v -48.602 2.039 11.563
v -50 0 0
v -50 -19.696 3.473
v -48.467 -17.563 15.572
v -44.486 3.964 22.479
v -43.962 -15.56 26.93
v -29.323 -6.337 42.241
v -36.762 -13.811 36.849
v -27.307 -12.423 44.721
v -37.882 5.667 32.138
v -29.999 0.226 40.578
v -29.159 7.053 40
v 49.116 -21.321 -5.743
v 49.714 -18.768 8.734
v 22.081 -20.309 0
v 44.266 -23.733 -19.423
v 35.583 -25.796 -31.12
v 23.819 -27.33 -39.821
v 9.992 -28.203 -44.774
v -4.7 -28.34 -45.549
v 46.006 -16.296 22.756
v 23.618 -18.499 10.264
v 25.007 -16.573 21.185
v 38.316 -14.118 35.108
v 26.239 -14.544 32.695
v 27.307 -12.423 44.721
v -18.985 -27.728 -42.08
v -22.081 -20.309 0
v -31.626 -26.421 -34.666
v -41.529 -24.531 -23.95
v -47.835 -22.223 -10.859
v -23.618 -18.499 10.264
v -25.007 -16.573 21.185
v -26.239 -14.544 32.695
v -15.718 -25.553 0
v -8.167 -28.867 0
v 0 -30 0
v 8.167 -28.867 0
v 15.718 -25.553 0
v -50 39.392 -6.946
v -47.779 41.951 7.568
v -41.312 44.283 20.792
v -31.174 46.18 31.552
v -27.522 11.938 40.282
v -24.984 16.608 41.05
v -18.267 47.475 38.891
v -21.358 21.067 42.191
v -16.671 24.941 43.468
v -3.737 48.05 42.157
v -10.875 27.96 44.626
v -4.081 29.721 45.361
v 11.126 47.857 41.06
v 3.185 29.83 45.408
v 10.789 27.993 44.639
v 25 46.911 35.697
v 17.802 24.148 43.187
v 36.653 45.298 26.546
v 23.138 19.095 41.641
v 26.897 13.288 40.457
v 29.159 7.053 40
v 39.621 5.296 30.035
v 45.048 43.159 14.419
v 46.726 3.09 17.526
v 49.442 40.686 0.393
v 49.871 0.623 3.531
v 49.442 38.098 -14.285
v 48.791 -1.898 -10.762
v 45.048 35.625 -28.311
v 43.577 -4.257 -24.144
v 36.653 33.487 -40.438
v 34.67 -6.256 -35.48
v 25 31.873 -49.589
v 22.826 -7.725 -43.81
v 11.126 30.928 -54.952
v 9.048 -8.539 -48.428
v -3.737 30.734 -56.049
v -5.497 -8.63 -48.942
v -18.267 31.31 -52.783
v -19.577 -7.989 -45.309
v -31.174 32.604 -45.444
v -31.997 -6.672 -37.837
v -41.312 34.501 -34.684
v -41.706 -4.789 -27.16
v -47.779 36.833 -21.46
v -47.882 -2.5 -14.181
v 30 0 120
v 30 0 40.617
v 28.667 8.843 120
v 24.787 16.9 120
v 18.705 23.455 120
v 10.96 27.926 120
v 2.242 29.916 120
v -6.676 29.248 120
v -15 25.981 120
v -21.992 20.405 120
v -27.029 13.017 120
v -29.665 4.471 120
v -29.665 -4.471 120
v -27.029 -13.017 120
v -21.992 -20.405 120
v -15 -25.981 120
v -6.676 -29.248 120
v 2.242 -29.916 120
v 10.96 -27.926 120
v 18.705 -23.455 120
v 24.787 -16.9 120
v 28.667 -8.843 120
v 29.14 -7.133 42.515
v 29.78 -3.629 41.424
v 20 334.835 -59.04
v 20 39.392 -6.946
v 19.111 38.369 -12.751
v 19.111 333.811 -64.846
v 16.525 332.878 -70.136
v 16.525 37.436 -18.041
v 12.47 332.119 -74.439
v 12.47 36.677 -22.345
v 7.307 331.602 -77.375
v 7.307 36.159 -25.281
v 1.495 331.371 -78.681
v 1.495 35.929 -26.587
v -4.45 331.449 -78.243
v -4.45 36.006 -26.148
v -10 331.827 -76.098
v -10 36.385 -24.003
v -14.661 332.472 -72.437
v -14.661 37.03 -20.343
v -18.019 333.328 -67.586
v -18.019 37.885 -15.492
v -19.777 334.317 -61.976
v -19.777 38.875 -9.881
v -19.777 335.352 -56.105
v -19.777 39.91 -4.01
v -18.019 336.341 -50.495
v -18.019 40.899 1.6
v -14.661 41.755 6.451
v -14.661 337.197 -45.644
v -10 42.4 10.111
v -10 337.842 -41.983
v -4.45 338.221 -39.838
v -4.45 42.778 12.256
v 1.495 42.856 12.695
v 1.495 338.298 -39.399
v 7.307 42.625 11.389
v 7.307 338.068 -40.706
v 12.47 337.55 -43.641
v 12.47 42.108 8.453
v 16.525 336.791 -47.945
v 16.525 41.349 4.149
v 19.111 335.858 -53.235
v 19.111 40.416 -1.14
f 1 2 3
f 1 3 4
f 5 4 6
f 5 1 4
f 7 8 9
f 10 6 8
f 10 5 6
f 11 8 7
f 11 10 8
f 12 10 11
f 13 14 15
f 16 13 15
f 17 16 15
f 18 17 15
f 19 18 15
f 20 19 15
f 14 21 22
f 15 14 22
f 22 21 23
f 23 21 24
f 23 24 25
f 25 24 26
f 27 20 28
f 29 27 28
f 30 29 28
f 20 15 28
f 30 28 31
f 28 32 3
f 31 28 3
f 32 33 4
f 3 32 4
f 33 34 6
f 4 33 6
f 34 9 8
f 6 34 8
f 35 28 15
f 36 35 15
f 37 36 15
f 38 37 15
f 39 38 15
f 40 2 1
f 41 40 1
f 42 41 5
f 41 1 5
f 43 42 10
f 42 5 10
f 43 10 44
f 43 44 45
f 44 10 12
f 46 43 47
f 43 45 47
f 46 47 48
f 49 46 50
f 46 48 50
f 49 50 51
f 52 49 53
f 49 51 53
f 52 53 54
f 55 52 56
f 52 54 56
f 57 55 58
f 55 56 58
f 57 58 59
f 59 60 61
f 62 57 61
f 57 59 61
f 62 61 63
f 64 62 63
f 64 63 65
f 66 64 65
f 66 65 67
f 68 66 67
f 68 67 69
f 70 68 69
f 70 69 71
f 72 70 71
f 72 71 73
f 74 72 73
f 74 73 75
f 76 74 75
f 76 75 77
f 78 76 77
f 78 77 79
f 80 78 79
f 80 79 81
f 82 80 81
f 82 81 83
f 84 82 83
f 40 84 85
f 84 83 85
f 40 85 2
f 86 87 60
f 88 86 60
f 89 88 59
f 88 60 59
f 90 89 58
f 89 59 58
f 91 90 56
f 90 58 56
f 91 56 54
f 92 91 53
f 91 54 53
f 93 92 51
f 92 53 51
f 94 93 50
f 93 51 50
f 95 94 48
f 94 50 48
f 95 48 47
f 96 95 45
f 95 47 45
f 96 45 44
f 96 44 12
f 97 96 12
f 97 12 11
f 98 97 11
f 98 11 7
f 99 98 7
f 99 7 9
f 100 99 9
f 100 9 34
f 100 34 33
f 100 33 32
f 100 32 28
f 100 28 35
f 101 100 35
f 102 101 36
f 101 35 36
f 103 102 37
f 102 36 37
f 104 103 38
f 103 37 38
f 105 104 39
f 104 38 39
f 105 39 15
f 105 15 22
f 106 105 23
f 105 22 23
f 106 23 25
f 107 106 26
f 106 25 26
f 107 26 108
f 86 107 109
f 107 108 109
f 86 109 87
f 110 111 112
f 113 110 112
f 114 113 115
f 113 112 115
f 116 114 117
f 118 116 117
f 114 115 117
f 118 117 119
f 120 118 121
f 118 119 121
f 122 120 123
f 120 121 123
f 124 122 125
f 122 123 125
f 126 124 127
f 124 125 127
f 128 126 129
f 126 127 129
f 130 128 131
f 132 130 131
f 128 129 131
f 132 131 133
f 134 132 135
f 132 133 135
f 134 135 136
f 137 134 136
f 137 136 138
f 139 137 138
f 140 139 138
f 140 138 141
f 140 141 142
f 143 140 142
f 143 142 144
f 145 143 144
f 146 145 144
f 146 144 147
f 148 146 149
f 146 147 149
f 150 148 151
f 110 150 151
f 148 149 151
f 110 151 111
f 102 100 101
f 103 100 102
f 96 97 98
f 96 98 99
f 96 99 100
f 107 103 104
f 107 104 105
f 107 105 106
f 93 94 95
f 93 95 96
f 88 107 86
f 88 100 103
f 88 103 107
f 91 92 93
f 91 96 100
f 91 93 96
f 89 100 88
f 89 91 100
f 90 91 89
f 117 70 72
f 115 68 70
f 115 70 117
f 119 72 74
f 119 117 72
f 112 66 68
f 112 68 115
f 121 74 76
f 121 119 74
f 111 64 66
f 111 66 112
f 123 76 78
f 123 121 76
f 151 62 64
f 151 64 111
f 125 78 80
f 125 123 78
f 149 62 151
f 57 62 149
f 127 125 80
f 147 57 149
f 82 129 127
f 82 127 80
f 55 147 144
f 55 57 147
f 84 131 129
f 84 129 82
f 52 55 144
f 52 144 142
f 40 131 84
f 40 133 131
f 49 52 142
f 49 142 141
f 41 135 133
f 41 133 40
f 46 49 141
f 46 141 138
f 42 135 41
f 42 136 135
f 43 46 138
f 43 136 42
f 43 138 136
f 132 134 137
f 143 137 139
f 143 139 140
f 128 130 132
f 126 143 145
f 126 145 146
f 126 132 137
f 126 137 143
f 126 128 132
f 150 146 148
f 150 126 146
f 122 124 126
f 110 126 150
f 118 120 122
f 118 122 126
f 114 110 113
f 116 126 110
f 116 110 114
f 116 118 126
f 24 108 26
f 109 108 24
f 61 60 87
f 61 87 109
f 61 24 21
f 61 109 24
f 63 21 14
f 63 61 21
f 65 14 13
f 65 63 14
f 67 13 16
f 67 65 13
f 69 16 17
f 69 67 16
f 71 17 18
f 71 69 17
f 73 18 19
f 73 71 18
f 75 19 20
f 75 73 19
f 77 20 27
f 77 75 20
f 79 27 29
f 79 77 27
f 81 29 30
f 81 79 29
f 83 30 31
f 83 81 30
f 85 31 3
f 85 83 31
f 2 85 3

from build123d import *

# Parameters (mm, degrees)
SKETCH1_R                = 30
BOSS_EXTRUDE1_DEPTH      = 120
BOSS_EXTRUDE2_DEPTH      = 40
BOSS_EXTRUDE2_DEPTH_BACK = 20
SKETCH2_R                = 50
SKETCH3_R                = 20
BOSS_EXTRUDE3_DEPTH      = 300


with BuildPart() as part:
    # Sketch1 → Boss-Extrude1 (new body)
    with BuildSketch(Plane.XY):
        Circle(SKETCH1_R)
    extrude(amount=BOSS_EXTRUDE1_DEPTH)

    # Sketch2 → Boss-Extrude2 (add, two sides: drawn at the far end of the back side and taken through both)
    with BuildSketch(Plane(origin=(0, 0, 0), x_dir=(-1, 0, 0), z_dir=(0, 0.984807753012208, -0.17364817766693072)).offset(-BOSS_EXTRUDE2_DEPTH_BACK)):
        Circle(SKETCH2_R)
    extrude(amount=BOSS_EXTRUDE2_DEPTH + BOSS_EXTRUDE2_DEPTH_BACK)

    # Sketch3 → Boss-Extrude3 (add)
    with BuildSketch(Plane(origin=(0, 39.39231012, -6.945927107), x_dir=(1, 0, 0), z_dir=(0, 0.9848077530122081, -0.17364817766693072))):
        Circle(SKETCH3_R)
    extrude(amount=BOSS_EXTRUDE3_DEPTH)


solid = part.part
